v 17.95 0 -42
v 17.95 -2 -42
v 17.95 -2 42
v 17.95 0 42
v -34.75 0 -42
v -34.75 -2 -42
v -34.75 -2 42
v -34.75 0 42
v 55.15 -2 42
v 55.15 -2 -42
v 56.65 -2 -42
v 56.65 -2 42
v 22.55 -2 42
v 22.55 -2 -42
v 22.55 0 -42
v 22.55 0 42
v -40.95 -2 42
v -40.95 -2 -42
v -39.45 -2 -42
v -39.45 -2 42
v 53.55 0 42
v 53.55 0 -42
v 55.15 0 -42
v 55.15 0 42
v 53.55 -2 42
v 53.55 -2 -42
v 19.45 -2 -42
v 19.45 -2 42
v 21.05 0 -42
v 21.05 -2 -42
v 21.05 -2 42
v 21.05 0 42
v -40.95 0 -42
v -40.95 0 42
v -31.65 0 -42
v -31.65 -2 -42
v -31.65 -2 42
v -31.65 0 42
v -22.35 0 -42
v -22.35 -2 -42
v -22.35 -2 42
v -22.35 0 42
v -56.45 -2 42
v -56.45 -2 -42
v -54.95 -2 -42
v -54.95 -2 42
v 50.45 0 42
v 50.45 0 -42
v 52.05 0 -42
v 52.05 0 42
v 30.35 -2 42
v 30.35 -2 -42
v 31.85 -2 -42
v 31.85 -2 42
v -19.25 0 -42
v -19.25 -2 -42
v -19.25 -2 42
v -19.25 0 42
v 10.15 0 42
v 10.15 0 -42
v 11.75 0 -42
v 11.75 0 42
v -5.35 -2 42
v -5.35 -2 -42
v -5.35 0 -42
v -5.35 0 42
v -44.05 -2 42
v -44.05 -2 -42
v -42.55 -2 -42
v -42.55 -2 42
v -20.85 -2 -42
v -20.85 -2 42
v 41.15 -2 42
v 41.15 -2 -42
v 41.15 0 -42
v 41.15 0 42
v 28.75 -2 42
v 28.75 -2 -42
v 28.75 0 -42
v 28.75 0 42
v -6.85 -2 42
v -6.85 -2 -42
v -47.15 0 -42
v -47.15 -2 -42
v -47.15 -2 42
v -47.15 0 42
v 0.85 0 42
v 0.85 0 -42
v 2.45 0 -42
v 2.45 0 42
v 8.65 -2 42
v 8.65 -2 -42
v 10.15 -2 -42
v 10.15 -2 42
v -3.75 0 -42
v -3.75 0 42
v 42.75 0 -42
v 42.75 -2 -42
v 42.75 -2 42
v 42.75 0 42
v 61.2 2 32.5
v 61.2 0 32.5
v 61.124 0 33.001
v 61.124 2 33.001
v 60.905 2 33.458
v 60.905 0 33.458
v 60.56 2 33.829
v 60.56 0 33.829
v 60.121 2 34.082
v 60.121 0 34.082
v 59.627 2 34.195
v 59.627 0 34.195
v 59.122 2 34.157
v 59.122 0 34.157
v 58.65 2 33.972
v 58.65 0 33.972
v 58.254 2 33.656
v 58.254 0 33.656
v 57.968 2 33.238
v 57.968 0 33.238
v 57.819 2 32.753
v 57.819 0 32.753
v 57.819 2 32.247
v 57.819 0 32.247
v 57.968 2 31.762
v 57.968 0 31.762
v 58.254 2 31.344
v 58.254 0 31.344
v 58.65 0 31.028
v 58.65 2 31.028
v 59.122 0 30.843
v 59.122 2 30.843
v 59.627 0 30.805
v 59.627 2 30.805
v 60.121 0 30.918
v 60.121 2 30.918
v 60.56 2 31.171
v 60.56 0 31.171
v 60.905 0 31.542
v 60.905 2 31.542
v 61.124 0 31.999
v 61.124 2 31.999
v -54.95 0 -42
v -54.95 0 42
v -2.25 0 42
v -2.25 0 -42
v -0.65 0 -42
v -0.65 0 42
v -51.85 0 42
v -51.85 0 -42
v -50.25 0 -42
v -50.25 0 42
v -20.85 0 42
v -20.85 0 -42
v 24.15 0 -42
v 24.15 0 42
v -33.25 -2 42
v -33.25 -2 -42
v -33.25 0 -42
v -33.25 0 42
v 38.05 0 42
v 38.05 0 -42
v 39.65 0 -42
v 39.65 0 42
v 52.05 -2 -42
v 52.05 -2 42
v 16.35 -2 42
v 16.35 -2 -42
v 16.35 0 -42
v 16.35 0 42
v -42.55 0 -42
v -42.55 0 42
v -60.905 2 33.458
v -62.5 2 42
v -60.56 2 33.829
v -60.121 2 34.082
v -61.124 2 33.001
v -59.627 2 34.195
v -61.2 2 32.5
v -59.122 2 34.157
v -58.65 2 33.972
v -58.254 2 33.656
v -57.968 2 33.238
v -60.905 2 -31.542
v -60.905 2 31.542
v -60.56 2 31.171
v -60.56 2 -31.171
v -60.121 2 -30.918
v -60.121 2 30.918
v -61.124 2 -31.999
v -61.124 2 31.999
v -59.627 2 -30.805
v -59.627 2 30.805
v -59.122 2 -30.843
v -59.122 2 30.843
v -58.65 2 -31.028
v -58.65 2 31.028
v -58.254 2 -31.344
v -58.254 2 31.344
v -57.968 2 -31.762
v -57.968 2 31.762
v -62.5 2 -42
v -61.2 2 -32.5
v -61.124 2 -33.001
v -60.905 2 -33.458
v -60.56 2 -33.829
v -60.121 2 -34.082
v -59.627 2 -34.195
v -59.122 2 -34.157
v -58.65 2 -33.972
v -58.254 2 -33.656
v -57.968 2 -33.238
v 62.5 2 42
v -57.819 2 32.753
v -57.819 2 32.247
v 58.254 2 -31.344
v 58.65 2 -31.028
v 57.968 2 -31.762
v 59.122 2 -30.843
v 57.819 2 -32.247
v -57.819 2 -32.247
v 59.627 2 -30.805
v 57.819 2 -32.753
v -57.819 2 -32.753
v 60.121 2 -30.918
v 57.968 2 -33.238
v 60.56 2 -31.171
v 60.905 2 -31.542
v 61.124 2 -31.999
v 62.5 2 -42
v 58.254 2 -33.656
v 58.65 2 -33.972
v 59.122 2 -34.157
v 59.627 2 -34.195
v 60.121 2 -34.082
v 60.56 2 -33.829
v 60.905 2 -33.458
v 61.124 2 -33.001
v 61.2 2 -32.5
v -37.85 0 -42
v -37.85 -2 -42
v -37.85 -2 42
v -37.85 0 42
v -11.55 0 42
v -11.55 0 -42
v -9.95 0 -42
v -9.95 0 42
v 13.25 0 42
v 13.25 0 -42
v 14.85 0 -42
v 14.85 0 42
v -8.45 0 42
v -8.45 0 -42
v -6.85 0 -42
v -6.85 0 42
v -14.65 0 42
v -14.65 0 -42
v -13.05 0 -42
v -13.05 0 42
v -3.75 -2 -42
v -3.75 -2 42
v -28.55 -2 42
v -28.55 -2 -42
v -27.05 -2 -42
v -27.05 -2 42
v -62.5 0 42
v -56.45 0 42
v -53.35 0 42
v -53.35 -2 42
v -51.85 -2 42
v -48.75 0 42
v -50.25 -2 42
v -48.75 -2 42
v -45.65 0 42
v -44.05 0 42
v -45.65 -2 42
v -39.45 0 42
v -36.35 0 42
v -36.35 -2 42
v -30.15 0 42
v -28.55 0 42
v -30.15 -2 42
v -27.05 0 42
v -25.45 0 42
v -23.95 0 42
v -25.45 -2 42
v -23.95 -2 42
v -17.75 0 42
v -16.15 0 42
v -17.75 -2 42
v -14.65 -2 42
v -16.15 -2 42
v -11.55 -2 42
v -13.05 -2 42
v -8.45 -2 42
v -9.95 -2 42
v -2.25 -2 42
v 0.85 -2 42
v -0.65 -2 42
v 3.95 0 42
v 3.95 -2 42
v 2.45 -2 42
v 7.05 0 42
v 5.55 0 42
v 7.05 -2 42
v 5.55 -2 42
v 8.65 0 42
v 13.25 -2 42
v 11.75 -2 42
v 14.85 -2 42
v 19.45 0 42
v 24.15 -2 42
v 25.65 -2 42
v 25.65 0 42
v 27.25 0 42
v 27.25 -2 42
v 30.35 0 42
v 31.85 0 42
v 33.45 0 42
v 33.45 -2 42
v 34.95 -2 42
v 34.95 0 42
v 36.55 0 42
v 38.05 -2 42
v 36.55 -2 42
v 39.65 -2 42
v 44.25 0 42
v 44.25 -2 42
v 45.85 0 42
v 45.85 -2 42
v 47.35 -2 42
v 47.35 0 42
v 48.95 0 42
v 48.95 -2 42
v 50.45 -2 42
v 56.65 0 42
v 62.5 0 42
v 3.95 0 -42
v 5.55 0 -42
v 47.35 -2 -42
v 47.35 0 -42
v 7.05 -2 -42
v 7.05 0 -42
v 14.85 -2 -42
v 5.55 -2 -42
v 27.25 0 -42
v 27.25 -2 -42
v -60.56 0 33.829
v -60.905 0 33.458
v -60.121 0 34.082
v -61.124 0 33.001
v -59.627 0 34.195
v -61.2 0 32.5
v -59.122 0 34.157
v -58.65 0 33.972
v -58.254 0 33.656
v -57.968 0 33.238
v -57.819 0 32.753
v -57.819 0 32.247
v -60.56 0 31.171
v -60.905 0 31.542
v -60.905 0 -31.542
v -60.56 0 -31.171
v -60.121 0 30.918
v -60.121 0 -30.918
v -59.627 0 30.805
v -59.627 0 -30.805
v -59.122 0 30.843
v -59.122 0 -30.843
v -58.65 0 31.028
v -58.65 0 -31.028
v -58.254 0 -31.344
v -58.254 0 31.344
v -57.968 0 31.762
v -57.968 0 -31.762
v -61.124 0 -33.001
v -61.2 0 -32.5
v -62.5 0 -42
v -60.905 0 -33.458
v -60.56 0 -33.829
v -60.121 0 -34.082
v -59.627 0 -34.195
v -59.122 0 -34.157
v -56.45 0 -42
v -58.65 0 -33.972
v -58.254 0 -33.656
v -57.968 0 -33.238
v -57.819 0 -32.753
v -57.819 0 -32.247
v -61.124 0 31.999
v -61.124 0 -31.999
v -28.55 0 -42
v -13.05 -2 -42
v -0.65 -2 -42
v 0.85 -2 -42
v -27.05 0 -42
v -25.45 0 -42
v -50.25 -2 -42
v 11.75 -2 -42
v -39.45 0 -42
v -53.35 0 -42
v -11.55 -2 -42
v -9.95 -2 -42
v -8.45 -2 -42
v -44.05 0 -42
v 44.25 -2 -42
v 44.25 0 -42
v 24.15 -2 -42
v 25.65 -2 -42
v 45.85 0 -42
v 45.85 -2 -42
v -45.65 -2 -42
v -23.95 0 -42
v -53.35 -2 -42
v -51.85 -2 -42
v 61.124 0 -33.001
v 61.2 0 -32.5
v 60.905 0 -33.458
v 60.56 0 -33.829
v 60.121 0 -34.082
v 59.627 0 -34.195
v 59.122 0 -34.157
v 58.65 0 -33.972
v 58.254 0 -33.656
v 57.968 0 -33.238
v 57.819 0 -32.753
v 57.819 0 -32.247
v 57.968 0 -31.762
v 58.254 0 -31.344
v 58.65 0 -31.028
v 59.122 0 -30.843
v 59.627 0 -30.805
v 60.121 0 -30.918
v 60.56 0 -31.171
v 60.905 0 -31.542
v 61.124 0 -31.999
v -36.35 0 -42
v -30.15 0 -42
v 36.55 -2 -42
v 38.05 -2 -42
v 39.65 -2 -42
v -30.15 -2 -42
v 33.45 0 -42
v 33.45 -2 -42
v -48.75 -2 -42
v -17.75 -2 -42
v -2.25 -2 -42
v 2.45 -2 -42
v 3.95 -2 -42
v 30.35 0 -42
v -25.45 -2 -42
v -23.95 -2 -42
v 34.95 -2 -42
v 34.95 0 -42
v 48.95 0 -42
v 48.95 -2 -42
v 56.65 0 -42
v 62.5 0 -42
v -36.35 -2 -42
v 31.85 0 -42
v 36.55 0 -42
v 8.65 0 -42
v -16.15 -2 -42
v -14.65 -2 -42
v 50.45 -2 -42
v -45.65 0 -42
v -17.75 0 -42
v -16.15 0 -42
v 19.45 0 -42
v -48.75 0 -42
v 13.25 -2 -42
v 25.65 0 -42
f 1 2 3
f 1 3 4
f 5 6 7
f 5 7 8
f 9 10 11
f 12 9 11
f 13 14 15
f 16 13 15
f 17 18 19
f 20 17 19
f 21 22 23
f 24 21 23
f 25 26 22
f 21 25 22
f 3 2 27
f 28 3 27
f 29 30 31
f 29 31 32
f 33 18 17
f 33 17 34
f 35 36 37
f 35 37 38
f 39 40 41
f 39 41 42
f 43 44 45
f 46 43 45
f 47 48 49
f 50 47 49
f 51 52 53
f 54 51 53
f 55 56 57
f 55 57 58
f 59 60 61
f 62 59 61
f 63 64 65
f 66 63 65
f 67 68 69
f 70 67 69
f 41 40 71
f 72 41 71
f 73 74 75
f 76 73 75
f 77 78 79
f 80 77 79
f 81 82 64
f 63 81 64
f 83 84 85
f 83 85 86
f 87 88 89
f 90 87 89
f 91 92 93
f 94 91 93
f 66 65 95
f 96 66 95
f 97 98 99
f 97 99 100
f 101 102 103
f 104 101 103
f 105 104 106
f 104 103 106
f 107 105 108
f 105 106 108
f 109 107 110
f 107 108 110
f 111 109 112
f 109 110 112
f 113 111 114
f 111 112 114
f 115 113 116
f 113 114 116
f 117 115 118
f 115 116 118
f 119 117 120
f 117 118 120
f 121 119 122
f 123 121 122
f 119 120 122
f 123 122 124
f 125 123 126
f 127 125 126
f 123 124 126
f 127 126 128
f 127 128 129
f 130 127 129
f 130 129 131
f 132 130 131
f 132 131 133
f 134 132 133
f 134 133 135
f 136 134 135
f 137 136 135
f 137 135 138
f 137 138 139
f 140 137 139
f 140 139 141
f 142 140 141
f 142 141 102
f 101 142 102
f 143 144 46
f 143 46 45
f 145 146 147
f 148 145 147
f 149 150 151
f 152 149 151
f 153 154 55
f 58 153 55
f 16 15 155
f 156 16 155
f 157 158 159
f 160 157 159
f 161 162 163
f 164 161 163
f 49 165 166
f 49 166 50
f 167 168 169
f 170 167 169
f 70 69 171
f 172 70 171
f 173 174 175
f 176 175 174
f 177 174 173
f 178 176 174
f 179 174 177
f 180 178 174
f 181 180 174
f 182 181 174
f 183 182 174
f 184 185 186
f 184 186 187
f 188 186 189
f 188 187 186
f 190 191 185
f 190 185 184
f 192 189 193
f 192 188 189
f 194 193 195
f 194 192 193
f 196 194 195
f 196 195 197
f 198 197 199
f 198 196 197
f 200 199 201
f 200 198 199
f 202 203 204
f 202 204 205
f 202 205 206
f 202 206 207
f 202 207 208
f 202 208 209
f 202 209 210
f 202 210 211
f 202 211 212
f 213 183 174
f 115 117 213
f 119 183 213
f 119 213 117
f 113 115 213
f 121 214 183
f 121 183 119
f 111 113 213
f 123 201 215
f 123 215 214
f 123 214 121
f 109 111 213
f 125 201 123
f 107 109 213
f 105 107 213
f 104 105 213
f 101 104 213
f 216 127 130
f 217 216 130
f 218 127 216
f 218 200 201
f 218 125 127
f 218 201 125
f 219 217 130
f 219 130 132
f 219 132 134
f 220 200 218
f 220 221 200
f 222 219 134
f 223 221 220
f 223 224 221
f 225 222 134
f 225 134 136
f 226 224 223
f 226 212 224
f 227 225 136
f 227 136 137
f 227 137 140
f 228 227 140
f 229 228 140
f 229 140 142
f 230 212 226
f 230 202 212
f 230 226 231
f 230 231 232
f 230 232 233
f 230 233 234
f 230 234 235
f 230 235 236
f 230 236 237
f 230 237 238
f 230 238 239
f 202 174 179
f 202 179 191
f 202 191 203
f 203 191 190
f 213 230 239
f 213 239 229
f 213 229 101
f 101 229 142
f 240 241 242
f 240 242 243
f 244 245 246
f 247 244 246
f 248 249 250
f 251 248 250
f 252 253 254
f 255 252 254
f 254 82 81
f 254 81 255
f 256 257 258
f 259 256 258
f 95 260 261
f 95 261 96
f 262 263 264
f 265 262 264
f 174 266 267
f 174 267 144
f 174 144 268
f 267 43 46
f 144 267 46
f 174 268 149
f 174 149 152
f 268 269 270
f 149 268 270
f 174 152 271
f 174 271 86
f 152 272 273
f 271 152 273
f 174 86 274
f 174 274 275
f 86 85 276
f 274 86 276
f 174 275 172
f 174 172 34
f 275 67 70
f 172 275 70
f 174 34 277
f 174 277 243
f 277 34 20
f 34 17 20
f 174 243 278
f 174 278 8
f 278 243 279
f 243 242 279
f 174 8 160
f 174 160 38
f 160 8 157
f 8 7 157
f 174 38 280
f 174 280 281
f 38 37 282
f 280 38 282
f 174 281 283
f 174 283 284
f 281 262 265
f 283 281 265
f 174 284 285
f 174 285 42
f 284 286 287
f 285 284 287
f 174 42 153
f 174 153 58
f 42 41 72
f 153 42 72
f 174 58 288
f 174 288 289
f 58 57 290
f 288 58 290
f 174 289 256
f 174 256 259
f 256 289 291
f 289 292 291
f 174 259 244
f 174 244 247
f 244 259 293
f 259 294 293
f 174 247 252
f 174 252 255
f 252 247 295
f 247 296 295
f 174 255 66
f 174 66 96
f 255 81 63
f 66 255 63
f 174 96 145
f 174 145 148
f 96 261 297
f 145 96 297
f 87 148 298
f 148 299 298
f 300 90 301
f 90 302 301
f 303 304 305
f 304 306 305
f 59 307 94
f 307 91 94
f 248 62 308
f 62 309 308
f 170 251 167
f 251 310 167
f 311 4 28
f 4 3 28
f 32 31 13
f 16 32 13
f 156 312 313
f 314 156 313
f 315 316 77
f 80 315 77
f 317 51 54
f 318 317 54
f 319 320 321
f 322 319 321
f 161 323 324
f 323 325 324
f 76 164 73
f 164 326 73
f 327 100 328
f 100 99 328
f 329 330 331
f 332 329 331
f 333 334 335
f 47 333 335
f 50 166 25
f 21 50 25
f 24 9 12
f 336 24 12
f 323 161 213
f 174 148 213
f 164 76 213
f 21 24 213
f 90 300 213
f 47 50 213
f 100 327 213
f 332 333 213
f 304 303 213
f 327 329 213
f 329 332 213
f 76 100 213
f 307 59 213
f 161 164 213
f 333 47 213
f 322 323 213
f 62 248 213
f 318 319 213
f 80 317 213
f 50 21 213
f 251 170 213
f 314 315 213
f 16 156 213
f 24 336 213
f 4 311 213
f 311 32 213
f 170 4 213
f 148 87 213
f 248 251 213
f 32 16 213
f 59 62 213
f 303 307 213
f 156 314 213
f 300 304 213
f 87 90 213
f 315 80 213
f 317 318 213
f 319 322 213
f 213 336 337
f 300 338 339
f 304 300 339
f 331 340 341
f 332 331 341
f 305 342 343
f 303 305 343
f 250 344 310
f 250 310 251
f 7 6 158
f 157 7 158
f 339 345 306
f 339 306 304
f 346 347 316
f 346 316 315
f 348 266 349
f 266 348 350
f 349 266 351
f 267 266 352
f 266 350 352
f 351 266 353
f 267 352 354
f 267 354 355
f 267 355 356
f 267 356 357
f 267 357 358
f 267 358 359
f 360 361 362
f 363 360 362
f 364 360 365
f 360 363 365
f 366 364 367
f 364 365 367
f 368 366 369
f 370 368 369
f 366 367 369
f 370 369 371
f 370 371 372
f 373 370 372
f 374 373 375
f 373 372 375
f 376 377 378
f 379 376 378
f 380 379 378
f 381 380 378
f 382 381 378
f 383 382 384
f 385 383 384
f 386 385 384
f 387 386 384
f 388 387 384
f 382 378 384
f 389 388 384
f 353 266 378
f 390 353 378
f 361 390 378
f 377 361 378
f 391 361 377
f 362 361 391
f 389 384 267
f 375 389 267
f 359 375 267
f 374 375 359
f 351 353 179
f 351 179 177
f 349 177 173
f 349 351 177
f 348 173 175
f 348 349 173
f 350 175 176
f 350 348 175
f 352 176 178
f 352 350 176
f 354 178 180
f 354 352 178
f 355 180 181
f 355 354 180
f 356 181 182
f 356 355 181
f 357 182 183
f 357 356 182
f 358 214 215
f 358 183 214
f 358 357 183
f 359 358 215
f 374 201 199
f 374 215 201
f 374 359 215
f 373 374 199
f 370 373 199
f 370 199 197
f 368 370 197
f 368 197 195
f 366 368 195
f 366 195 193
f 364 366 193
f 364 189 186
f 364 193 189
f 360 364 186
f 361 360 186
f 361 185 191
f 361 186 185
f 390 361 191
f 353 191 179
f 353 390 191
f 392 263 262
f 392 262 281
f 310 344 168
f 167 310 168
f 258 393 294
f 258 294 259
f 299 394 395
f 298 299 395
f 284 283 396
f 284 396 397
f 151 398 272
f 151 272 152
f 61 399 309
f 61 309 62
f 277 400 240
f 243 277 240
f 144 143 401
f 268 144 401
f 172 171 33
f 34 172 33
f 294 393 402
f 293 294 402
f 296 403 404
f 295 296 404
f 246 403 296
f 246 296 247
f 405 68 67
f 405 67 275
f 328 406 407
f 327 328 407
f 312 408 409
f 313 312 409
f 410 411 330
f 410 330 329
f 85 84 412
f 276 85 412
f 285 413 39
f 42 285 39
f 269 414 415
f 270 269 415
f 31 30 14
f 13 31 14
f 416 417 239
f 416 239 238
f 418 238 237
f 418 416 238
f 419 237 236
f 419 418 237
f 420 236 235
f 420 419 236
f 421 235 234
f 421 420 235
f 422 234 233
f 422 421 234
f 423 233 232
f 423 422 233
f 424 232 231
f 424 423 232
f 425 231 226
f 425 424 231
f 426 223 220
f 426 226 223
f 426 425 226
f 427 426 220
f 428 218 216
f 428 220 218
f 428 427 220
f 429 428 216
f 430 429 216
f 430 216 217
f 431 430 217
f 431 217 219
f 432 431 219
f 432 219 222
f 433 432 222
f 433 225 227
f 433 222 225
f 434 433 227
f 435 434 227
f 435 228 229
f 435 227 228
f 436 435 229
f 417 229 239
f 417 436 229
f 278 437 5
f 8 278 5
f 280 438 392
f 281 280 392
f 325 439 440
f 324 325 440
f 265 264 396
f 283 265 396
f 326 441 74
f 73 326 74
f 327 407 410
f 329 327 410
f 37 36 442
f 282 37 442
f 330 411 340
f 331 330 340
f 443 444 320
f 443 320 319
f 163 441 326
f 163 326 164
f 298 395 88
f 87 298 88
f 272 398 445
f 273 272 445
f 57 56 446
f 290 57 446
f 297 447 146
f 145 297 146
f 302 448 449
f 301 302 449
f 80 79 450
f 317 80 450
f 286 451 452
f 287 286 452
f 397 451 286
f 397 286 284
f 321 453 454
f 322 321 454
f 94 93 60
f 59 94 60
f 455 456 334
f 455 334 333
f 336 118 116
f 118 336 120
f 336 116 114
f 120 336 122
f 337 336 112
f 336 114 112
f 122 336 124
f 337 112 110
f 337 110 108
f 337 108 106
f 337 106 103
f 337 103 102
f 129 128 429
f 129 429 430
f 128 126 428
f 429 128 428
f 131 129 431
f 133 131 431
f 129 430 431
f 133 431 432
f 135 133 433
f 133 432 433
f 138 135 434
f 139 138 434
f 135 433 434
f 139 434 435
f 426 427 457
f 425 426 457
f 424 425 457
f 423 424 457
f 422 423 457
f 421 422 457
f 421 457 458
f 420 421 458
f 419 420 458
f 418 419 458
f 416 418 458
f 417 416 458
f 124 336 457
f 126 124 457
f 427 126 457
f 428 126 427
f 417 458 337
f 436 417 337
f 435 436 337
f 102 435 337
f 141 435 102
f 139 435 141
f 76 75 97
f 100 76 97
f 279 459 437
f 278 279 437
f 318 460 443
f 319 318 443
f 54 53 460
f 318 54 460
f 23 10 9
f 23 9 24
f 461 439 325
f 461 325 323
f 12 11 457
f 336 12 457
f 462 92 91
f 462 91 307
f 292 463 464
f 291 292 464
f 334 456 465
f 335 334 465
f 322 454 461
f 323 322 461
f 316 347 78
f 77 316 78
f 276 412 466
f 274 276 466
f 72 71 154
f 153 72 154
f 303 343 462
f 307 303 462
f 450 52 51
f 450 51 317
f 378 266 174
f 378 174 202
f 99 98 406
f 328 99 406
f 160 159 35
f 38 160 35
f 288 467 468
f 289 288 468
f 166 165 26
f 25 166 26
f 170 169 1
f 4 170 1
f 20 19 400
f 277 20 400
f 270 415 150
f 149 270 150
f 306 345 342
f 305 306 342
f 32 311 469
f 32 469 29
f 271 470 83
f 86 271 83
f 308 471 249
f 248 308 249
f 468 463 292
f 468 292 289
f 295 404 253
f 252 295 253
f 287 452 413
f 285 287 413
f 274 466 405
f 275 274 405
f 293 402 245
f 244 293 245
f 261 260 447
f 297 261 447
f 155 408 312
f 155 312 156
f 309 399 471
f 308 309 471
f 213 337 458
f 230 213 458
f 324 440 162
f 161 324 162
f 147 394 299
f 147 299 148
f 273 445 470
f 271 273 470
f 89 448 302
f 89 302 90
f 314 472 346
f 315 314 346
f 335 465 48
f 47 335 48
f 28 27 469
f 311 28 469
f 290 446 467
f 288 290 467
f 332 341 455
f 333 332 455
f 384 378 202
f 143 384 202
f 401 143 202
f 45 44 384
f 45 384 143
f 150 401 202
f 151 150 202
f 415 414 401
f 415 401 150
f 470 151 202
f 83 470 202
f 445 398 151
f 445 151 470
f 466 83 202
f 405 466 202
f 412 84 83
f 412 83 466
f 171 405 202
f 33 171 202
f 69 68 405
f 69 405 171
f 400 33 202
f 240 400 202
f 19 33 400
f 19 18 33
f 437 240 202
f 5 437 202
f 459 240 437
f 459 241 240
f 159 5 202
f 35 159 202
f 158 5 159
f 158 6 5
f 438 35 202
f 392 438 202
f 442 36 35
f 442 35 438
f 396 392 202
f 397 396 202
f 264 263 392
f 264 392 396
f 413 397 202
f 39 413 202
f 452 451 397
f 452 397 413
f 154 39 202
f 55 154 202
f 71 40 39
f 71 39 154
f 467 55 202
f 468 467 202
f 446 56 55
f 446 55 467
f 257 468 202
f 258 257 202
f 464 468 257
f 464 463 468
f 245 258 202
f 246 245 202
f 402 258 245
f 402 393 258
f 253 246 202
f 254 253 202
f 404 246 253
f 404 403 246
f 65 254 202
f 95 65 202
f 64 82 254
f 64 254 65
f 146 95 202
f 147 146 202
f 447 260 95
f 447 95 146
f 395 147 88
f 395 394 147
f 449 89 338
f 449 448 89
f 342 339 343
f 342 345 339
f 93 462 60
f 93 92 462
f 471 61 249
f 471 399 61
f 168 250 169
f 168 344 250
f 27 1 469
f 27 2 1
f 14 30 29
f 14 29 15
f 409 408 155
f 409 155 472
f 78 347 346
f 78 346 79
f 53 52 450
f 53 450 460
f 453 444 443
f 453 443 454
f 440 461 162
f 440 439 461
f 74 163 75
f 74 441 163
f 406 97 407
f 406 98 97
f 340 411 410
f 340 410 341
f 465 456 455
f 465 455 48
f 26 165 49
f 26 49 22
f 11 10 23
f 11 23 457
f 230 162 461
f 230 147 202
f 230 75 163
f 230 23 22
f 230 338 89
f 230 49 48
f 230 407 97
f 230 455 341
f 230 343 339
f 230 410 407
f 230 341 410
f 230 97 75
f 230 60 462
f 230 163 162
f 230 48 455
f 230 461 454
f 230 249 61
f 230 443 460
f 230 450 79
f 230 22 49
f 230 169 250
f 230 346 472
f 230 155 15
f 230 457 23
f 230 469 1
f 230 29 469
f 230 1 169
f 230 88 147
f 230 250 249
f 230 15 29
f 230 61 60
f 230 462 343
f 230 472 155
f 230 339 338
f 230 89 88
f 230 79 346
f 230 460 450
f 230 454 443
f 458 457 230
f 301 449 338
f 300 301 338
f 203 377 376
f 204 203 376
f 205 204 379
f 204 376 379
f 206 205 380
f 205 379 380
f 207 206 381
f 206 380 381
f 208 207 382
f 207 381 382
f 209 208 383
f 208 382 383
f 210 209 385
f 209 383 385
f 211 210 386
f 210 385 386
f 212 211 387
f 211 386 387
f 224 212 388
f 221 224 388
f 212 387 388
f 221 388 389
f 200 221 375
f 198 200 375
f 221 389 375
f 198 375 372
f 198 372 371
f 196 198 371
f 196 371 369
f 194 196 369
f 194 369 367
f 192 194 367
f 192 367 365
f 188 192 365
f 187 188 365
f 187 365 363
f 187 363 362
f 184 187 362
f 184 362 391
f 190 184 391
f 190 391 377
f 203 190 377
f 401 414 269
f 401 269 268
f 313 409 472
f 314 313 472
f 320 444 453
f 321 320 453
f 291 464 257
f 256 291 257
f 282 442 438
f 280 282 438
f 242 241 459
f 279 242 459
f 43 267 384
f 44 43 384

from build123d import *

# Parameters (mm, degrees)
SKETCH1_W               = 125
SKETCH1_H               = 84
BOSS_EXTRUDE1_DEPTH     = 2
M3_CLEARANCE_HOLE1_D    = 3.4
MIRROR2_COPY_1_D        = 3.4
SKETCH4_W               = 1.5
SKETCH4_H               = 84
BOSS_EXTRUDE2_DEPTH     = 2
FILL_START              = -42
FILL_PATTERN2_OUTLINE_W = 1.5
FILL_PATTERN2_OUTLINE_H = 2
FILL_PATTERN2_DEPTH     = 84


# Read off the part's stored shape, not the designer's step: Fill Pattern2
with BuildPart() as part:
    # Sketch1 → Boss-Extrude1 (new body)
    with BuildSketch(Plane(origin=(0, 0, 0), x_dir=(1, 0, 0), z_dir=(0, 1, 0))):
        Rectangle(SKETCH1_W, SKETCH1_H)
    extrude(amount=BOSS_EXTRUDE1_DEPTH)

    # M3 Clearance Hole1 (through all)
    with Locations(Plane(origin=(0, 2, 0), x_dir=(1, 0, 0), z_dir=(0, 1, 0))):
        with Locations((-59.5, 32.5)):
            m3_clearance_hole1 = Hole(M3_CLEARANCE_HOLE1_D / 2)

    # Mirror1: M3 Clearance Hole1 across plane
    add(m3_clearance_hole1.mirror(Plane(origin=(0, 0, 0), x_dir=(0, 0, 1), z_dir=(1, 0, 0))), mode=Mode.SUBTRACT)

    # Mirror2: M3 Clearance Hole1 across plane
    add(m3_clearance_hole1.mirror(Plane.XY), mode=Mode.SUBTRACT)

    # Mirror2 copy 1 (through all)
    with Locations(Plane(origin=(0, 2, 0), x_dir=(-1, 0, 0), z_dir=(0, 1, 0))):
        with Locations((-59.5, 32.5)):
            Hole(MIRROR2_COPY_1_D / 2)

    # Sketch4 → Boss-Extrude2 (add)
    with BuildSketch(Plane(origin=(0, 0, 0), x_dir=(1, 0, 0), z_dir=(0, 1, 0))):
        with Locations((-55.7, 0)):
            Rectangle(SKETCH4_W, SKETCH4_H)
    extrude(amount=-BOSS_EXTRUDE2_DEPTH)

    # Fill Pattern2 outline → Fill Pattern2 (add)
    with BuildSketch(Plane.XY.offset(FILL_START)):
        with Locations((55.9, -1)):
            Rectangle(FILL_PATTERN2_OUTLINE_W, FILL_PATTERN2_OUTLINE_H)
        with Locations((52.8, -1)):
            Rectangle(FILL_PATTERN2_OUTLINE_W, FILL_PATTERN2_OUTLINE_H)
        with Locations((49.7, -1)):
            Rectangle(FILL_PATTERN2_OUTLINE_W, FILL_PATTERN2_OUTLINE_H)
        with Locations((46.6, -1)):
            Rectangle(FILL_PATTERN2_OUTLINE_W, FILL_PATTERN2_OUTLINE_H)
        with Locations((43.5, -1)):
            Rectangle(FILL_PATTERN2_OUTLINE_W, FILL_PATTERN2_OUTLINE_H)
        with Locations((40.4, -1)):
            Rectangle(FILL_PATTERN2_OUTLINE_W, FILL_PATTERN2_OUTLINE_H)
        with Locations((37.3, -1)):
            Rectangle(FILL_PATTERN2_OUTLINE_W, FILL_PATTERN2_OUTLINE_H)
        with Locations((34.2, -1)):
            Rectangle(FILL_PATTERN2_OUTLINE_W, FILL_PATTERN2_OUTLINE_H)
        with Locations((31.1, -1)):
            Rectangle(FILL_PATTERN2_OUTLINE_W, FILL_PATTERN2_OUTLINE_H)
        with Locations((28, -1)):
            Rectangle(FILL_PATTERN2_OUTLINE_W, FILL_PATTERN2_OUTLINE_H)
        with Locations((24.9, -1)):
            Rectangle(FILL_PATTERN2_OUTLINE_W, FILL_PATTERN2_OUTLINE_H)
        with Locations((21.8, -1)):
            Rectangle(FILL_PATTERN2_OUTLINE_W, FILL_PATTERN2_OUTLINE_H)
        with Locations((18.7, -1)):
            Rectangle(FILL_PATTERN2_OUTLINE_W, FILL_PATTERN2_OUTLINE_H)
        with Locations((15.6, -1)):
            Rectangle(FILL_PATTERN2_OUTLINE_W, FILL_PATTERN2_OUTLINE_H)
        with Locations((12.5, -1)):
            Rectangle(FILL_PATTERN2_OUTLINE_W, FILL_PATTERN2_OUTLINE_H)
        with Locations((9.4, -1)):
            Rectangle(FILL_PATTERN2_OUTLINE_W, FILL_PATTERN2_OUTLINE_H)
        with Locations((6.3, -1)):
            Rectangle(FILL_PATTERN2_OUTLINE_W, FILL_PATTERN2_OUTLINE_H)
        with Locations((3.2, -1)):
            Rectangle(FILL_PATTERN2_OUTLINE_W, FILL_PATTERN2_OUTLINE_H)
        with Locations((0.1, -1)):
            Rectangle(FILL_PATTERN2_OUTLINE_W, FILL_PATTERN2_OUTLINE_H)
        with Locations((-3, -1)):
            Rectangle(FILL_PATTERN2_OUTLINE_W, FILL_PATTERN2_OUTLINE_H)
        with Locations((-6.1, -1)):
            Rectangle(FILL_PATTERN2_OUTLINE_W, FILL_PATTERN2_OUTLINE_H)
        with Locations((-9.2, -1)):
            Rectangle(FILL_PATTERN2_OUTLINE_W, FILL_PATTERN2_OUTLINE_H)
        with Locations((-12.3, -1)):
            Rectangle(FILL_PATTERN2_OUTLINE_W, FILL_PATTERN2_OUTLINE_H)
        with Locations((-15.4, -1)):
            Rectangle(FILL_PATTERN2_OUTLINE_W, FILL_PATTERN2_OUTLINE_H)
        with Locations((-18.5, -1)):
            Rectangle(FILL_PATTERN2_OUTLINE_W, FILL_PATTERN2_OUTLINE_H)
        with Locations((-21.6, -1)):
            Rectangle(FILL_PATTERN2_OUTLINE_W, FILL_PATTERN2_OUTLINE_H)
        with Locations((-24.7, -1)):
            Rectangle(FILL_PATTERN2_OUTLINE_W, FILL_PATTERN2_OUTLINE_H)
        with Locations((-27.8, -1)):
            Rectangle(FILL_PATTERN2_OUTLINE_W, FILL_PATTERN2_OUTLINE_H)
        with Locations((-30.9, -1)):
            Rectangle(FILL_PATTERN2_OUTLINE_W, FILL_PATTERN2_OUTLINE_H)
        with Locations((-34, -1)):
            Rectangle(FILL_PATTERN2_OUTLINE_W, FILL_PATTERN2_OUTLINE_H)
        with Locations((-37.1, -1)):
            Rectangle(FILL_PATTERN2_OUTLINE_W, FILL_PATTERN2_OUTLINE_H)
        with Locations((-40.2, -1)):
            Rectangle(FILL_PATTERN2_OUTLINE_W, FILL_PATTERN2_OUTLINE_H)
        with Locations((-43.3, -1)):
            Rectangle(FILL_PATTERN2_OUTLINE_W, FILL_PATTERN2_OUTLINE_H)
        with Locations((-46.4, -1)):
            Rectangle(FILL_PATTERN2_OUTLINE_W, FILL_PATTERN2_OUTLINE_H)
        with Locations((-49.5, -1)):
            Rectangle(FILL_PATTERN2_OUTLINE_W, FILL_PATTERN2_OUTLINE_H)
        with Locations((-52.6, -1)):
            Rectangle(FILL_PATTERN2_OUTLINE_W, FILL_PATTERN2_OUTLINE_H)
    extrude(amount=FILL_PATTERN2_DEPTH)


solid = part.part
